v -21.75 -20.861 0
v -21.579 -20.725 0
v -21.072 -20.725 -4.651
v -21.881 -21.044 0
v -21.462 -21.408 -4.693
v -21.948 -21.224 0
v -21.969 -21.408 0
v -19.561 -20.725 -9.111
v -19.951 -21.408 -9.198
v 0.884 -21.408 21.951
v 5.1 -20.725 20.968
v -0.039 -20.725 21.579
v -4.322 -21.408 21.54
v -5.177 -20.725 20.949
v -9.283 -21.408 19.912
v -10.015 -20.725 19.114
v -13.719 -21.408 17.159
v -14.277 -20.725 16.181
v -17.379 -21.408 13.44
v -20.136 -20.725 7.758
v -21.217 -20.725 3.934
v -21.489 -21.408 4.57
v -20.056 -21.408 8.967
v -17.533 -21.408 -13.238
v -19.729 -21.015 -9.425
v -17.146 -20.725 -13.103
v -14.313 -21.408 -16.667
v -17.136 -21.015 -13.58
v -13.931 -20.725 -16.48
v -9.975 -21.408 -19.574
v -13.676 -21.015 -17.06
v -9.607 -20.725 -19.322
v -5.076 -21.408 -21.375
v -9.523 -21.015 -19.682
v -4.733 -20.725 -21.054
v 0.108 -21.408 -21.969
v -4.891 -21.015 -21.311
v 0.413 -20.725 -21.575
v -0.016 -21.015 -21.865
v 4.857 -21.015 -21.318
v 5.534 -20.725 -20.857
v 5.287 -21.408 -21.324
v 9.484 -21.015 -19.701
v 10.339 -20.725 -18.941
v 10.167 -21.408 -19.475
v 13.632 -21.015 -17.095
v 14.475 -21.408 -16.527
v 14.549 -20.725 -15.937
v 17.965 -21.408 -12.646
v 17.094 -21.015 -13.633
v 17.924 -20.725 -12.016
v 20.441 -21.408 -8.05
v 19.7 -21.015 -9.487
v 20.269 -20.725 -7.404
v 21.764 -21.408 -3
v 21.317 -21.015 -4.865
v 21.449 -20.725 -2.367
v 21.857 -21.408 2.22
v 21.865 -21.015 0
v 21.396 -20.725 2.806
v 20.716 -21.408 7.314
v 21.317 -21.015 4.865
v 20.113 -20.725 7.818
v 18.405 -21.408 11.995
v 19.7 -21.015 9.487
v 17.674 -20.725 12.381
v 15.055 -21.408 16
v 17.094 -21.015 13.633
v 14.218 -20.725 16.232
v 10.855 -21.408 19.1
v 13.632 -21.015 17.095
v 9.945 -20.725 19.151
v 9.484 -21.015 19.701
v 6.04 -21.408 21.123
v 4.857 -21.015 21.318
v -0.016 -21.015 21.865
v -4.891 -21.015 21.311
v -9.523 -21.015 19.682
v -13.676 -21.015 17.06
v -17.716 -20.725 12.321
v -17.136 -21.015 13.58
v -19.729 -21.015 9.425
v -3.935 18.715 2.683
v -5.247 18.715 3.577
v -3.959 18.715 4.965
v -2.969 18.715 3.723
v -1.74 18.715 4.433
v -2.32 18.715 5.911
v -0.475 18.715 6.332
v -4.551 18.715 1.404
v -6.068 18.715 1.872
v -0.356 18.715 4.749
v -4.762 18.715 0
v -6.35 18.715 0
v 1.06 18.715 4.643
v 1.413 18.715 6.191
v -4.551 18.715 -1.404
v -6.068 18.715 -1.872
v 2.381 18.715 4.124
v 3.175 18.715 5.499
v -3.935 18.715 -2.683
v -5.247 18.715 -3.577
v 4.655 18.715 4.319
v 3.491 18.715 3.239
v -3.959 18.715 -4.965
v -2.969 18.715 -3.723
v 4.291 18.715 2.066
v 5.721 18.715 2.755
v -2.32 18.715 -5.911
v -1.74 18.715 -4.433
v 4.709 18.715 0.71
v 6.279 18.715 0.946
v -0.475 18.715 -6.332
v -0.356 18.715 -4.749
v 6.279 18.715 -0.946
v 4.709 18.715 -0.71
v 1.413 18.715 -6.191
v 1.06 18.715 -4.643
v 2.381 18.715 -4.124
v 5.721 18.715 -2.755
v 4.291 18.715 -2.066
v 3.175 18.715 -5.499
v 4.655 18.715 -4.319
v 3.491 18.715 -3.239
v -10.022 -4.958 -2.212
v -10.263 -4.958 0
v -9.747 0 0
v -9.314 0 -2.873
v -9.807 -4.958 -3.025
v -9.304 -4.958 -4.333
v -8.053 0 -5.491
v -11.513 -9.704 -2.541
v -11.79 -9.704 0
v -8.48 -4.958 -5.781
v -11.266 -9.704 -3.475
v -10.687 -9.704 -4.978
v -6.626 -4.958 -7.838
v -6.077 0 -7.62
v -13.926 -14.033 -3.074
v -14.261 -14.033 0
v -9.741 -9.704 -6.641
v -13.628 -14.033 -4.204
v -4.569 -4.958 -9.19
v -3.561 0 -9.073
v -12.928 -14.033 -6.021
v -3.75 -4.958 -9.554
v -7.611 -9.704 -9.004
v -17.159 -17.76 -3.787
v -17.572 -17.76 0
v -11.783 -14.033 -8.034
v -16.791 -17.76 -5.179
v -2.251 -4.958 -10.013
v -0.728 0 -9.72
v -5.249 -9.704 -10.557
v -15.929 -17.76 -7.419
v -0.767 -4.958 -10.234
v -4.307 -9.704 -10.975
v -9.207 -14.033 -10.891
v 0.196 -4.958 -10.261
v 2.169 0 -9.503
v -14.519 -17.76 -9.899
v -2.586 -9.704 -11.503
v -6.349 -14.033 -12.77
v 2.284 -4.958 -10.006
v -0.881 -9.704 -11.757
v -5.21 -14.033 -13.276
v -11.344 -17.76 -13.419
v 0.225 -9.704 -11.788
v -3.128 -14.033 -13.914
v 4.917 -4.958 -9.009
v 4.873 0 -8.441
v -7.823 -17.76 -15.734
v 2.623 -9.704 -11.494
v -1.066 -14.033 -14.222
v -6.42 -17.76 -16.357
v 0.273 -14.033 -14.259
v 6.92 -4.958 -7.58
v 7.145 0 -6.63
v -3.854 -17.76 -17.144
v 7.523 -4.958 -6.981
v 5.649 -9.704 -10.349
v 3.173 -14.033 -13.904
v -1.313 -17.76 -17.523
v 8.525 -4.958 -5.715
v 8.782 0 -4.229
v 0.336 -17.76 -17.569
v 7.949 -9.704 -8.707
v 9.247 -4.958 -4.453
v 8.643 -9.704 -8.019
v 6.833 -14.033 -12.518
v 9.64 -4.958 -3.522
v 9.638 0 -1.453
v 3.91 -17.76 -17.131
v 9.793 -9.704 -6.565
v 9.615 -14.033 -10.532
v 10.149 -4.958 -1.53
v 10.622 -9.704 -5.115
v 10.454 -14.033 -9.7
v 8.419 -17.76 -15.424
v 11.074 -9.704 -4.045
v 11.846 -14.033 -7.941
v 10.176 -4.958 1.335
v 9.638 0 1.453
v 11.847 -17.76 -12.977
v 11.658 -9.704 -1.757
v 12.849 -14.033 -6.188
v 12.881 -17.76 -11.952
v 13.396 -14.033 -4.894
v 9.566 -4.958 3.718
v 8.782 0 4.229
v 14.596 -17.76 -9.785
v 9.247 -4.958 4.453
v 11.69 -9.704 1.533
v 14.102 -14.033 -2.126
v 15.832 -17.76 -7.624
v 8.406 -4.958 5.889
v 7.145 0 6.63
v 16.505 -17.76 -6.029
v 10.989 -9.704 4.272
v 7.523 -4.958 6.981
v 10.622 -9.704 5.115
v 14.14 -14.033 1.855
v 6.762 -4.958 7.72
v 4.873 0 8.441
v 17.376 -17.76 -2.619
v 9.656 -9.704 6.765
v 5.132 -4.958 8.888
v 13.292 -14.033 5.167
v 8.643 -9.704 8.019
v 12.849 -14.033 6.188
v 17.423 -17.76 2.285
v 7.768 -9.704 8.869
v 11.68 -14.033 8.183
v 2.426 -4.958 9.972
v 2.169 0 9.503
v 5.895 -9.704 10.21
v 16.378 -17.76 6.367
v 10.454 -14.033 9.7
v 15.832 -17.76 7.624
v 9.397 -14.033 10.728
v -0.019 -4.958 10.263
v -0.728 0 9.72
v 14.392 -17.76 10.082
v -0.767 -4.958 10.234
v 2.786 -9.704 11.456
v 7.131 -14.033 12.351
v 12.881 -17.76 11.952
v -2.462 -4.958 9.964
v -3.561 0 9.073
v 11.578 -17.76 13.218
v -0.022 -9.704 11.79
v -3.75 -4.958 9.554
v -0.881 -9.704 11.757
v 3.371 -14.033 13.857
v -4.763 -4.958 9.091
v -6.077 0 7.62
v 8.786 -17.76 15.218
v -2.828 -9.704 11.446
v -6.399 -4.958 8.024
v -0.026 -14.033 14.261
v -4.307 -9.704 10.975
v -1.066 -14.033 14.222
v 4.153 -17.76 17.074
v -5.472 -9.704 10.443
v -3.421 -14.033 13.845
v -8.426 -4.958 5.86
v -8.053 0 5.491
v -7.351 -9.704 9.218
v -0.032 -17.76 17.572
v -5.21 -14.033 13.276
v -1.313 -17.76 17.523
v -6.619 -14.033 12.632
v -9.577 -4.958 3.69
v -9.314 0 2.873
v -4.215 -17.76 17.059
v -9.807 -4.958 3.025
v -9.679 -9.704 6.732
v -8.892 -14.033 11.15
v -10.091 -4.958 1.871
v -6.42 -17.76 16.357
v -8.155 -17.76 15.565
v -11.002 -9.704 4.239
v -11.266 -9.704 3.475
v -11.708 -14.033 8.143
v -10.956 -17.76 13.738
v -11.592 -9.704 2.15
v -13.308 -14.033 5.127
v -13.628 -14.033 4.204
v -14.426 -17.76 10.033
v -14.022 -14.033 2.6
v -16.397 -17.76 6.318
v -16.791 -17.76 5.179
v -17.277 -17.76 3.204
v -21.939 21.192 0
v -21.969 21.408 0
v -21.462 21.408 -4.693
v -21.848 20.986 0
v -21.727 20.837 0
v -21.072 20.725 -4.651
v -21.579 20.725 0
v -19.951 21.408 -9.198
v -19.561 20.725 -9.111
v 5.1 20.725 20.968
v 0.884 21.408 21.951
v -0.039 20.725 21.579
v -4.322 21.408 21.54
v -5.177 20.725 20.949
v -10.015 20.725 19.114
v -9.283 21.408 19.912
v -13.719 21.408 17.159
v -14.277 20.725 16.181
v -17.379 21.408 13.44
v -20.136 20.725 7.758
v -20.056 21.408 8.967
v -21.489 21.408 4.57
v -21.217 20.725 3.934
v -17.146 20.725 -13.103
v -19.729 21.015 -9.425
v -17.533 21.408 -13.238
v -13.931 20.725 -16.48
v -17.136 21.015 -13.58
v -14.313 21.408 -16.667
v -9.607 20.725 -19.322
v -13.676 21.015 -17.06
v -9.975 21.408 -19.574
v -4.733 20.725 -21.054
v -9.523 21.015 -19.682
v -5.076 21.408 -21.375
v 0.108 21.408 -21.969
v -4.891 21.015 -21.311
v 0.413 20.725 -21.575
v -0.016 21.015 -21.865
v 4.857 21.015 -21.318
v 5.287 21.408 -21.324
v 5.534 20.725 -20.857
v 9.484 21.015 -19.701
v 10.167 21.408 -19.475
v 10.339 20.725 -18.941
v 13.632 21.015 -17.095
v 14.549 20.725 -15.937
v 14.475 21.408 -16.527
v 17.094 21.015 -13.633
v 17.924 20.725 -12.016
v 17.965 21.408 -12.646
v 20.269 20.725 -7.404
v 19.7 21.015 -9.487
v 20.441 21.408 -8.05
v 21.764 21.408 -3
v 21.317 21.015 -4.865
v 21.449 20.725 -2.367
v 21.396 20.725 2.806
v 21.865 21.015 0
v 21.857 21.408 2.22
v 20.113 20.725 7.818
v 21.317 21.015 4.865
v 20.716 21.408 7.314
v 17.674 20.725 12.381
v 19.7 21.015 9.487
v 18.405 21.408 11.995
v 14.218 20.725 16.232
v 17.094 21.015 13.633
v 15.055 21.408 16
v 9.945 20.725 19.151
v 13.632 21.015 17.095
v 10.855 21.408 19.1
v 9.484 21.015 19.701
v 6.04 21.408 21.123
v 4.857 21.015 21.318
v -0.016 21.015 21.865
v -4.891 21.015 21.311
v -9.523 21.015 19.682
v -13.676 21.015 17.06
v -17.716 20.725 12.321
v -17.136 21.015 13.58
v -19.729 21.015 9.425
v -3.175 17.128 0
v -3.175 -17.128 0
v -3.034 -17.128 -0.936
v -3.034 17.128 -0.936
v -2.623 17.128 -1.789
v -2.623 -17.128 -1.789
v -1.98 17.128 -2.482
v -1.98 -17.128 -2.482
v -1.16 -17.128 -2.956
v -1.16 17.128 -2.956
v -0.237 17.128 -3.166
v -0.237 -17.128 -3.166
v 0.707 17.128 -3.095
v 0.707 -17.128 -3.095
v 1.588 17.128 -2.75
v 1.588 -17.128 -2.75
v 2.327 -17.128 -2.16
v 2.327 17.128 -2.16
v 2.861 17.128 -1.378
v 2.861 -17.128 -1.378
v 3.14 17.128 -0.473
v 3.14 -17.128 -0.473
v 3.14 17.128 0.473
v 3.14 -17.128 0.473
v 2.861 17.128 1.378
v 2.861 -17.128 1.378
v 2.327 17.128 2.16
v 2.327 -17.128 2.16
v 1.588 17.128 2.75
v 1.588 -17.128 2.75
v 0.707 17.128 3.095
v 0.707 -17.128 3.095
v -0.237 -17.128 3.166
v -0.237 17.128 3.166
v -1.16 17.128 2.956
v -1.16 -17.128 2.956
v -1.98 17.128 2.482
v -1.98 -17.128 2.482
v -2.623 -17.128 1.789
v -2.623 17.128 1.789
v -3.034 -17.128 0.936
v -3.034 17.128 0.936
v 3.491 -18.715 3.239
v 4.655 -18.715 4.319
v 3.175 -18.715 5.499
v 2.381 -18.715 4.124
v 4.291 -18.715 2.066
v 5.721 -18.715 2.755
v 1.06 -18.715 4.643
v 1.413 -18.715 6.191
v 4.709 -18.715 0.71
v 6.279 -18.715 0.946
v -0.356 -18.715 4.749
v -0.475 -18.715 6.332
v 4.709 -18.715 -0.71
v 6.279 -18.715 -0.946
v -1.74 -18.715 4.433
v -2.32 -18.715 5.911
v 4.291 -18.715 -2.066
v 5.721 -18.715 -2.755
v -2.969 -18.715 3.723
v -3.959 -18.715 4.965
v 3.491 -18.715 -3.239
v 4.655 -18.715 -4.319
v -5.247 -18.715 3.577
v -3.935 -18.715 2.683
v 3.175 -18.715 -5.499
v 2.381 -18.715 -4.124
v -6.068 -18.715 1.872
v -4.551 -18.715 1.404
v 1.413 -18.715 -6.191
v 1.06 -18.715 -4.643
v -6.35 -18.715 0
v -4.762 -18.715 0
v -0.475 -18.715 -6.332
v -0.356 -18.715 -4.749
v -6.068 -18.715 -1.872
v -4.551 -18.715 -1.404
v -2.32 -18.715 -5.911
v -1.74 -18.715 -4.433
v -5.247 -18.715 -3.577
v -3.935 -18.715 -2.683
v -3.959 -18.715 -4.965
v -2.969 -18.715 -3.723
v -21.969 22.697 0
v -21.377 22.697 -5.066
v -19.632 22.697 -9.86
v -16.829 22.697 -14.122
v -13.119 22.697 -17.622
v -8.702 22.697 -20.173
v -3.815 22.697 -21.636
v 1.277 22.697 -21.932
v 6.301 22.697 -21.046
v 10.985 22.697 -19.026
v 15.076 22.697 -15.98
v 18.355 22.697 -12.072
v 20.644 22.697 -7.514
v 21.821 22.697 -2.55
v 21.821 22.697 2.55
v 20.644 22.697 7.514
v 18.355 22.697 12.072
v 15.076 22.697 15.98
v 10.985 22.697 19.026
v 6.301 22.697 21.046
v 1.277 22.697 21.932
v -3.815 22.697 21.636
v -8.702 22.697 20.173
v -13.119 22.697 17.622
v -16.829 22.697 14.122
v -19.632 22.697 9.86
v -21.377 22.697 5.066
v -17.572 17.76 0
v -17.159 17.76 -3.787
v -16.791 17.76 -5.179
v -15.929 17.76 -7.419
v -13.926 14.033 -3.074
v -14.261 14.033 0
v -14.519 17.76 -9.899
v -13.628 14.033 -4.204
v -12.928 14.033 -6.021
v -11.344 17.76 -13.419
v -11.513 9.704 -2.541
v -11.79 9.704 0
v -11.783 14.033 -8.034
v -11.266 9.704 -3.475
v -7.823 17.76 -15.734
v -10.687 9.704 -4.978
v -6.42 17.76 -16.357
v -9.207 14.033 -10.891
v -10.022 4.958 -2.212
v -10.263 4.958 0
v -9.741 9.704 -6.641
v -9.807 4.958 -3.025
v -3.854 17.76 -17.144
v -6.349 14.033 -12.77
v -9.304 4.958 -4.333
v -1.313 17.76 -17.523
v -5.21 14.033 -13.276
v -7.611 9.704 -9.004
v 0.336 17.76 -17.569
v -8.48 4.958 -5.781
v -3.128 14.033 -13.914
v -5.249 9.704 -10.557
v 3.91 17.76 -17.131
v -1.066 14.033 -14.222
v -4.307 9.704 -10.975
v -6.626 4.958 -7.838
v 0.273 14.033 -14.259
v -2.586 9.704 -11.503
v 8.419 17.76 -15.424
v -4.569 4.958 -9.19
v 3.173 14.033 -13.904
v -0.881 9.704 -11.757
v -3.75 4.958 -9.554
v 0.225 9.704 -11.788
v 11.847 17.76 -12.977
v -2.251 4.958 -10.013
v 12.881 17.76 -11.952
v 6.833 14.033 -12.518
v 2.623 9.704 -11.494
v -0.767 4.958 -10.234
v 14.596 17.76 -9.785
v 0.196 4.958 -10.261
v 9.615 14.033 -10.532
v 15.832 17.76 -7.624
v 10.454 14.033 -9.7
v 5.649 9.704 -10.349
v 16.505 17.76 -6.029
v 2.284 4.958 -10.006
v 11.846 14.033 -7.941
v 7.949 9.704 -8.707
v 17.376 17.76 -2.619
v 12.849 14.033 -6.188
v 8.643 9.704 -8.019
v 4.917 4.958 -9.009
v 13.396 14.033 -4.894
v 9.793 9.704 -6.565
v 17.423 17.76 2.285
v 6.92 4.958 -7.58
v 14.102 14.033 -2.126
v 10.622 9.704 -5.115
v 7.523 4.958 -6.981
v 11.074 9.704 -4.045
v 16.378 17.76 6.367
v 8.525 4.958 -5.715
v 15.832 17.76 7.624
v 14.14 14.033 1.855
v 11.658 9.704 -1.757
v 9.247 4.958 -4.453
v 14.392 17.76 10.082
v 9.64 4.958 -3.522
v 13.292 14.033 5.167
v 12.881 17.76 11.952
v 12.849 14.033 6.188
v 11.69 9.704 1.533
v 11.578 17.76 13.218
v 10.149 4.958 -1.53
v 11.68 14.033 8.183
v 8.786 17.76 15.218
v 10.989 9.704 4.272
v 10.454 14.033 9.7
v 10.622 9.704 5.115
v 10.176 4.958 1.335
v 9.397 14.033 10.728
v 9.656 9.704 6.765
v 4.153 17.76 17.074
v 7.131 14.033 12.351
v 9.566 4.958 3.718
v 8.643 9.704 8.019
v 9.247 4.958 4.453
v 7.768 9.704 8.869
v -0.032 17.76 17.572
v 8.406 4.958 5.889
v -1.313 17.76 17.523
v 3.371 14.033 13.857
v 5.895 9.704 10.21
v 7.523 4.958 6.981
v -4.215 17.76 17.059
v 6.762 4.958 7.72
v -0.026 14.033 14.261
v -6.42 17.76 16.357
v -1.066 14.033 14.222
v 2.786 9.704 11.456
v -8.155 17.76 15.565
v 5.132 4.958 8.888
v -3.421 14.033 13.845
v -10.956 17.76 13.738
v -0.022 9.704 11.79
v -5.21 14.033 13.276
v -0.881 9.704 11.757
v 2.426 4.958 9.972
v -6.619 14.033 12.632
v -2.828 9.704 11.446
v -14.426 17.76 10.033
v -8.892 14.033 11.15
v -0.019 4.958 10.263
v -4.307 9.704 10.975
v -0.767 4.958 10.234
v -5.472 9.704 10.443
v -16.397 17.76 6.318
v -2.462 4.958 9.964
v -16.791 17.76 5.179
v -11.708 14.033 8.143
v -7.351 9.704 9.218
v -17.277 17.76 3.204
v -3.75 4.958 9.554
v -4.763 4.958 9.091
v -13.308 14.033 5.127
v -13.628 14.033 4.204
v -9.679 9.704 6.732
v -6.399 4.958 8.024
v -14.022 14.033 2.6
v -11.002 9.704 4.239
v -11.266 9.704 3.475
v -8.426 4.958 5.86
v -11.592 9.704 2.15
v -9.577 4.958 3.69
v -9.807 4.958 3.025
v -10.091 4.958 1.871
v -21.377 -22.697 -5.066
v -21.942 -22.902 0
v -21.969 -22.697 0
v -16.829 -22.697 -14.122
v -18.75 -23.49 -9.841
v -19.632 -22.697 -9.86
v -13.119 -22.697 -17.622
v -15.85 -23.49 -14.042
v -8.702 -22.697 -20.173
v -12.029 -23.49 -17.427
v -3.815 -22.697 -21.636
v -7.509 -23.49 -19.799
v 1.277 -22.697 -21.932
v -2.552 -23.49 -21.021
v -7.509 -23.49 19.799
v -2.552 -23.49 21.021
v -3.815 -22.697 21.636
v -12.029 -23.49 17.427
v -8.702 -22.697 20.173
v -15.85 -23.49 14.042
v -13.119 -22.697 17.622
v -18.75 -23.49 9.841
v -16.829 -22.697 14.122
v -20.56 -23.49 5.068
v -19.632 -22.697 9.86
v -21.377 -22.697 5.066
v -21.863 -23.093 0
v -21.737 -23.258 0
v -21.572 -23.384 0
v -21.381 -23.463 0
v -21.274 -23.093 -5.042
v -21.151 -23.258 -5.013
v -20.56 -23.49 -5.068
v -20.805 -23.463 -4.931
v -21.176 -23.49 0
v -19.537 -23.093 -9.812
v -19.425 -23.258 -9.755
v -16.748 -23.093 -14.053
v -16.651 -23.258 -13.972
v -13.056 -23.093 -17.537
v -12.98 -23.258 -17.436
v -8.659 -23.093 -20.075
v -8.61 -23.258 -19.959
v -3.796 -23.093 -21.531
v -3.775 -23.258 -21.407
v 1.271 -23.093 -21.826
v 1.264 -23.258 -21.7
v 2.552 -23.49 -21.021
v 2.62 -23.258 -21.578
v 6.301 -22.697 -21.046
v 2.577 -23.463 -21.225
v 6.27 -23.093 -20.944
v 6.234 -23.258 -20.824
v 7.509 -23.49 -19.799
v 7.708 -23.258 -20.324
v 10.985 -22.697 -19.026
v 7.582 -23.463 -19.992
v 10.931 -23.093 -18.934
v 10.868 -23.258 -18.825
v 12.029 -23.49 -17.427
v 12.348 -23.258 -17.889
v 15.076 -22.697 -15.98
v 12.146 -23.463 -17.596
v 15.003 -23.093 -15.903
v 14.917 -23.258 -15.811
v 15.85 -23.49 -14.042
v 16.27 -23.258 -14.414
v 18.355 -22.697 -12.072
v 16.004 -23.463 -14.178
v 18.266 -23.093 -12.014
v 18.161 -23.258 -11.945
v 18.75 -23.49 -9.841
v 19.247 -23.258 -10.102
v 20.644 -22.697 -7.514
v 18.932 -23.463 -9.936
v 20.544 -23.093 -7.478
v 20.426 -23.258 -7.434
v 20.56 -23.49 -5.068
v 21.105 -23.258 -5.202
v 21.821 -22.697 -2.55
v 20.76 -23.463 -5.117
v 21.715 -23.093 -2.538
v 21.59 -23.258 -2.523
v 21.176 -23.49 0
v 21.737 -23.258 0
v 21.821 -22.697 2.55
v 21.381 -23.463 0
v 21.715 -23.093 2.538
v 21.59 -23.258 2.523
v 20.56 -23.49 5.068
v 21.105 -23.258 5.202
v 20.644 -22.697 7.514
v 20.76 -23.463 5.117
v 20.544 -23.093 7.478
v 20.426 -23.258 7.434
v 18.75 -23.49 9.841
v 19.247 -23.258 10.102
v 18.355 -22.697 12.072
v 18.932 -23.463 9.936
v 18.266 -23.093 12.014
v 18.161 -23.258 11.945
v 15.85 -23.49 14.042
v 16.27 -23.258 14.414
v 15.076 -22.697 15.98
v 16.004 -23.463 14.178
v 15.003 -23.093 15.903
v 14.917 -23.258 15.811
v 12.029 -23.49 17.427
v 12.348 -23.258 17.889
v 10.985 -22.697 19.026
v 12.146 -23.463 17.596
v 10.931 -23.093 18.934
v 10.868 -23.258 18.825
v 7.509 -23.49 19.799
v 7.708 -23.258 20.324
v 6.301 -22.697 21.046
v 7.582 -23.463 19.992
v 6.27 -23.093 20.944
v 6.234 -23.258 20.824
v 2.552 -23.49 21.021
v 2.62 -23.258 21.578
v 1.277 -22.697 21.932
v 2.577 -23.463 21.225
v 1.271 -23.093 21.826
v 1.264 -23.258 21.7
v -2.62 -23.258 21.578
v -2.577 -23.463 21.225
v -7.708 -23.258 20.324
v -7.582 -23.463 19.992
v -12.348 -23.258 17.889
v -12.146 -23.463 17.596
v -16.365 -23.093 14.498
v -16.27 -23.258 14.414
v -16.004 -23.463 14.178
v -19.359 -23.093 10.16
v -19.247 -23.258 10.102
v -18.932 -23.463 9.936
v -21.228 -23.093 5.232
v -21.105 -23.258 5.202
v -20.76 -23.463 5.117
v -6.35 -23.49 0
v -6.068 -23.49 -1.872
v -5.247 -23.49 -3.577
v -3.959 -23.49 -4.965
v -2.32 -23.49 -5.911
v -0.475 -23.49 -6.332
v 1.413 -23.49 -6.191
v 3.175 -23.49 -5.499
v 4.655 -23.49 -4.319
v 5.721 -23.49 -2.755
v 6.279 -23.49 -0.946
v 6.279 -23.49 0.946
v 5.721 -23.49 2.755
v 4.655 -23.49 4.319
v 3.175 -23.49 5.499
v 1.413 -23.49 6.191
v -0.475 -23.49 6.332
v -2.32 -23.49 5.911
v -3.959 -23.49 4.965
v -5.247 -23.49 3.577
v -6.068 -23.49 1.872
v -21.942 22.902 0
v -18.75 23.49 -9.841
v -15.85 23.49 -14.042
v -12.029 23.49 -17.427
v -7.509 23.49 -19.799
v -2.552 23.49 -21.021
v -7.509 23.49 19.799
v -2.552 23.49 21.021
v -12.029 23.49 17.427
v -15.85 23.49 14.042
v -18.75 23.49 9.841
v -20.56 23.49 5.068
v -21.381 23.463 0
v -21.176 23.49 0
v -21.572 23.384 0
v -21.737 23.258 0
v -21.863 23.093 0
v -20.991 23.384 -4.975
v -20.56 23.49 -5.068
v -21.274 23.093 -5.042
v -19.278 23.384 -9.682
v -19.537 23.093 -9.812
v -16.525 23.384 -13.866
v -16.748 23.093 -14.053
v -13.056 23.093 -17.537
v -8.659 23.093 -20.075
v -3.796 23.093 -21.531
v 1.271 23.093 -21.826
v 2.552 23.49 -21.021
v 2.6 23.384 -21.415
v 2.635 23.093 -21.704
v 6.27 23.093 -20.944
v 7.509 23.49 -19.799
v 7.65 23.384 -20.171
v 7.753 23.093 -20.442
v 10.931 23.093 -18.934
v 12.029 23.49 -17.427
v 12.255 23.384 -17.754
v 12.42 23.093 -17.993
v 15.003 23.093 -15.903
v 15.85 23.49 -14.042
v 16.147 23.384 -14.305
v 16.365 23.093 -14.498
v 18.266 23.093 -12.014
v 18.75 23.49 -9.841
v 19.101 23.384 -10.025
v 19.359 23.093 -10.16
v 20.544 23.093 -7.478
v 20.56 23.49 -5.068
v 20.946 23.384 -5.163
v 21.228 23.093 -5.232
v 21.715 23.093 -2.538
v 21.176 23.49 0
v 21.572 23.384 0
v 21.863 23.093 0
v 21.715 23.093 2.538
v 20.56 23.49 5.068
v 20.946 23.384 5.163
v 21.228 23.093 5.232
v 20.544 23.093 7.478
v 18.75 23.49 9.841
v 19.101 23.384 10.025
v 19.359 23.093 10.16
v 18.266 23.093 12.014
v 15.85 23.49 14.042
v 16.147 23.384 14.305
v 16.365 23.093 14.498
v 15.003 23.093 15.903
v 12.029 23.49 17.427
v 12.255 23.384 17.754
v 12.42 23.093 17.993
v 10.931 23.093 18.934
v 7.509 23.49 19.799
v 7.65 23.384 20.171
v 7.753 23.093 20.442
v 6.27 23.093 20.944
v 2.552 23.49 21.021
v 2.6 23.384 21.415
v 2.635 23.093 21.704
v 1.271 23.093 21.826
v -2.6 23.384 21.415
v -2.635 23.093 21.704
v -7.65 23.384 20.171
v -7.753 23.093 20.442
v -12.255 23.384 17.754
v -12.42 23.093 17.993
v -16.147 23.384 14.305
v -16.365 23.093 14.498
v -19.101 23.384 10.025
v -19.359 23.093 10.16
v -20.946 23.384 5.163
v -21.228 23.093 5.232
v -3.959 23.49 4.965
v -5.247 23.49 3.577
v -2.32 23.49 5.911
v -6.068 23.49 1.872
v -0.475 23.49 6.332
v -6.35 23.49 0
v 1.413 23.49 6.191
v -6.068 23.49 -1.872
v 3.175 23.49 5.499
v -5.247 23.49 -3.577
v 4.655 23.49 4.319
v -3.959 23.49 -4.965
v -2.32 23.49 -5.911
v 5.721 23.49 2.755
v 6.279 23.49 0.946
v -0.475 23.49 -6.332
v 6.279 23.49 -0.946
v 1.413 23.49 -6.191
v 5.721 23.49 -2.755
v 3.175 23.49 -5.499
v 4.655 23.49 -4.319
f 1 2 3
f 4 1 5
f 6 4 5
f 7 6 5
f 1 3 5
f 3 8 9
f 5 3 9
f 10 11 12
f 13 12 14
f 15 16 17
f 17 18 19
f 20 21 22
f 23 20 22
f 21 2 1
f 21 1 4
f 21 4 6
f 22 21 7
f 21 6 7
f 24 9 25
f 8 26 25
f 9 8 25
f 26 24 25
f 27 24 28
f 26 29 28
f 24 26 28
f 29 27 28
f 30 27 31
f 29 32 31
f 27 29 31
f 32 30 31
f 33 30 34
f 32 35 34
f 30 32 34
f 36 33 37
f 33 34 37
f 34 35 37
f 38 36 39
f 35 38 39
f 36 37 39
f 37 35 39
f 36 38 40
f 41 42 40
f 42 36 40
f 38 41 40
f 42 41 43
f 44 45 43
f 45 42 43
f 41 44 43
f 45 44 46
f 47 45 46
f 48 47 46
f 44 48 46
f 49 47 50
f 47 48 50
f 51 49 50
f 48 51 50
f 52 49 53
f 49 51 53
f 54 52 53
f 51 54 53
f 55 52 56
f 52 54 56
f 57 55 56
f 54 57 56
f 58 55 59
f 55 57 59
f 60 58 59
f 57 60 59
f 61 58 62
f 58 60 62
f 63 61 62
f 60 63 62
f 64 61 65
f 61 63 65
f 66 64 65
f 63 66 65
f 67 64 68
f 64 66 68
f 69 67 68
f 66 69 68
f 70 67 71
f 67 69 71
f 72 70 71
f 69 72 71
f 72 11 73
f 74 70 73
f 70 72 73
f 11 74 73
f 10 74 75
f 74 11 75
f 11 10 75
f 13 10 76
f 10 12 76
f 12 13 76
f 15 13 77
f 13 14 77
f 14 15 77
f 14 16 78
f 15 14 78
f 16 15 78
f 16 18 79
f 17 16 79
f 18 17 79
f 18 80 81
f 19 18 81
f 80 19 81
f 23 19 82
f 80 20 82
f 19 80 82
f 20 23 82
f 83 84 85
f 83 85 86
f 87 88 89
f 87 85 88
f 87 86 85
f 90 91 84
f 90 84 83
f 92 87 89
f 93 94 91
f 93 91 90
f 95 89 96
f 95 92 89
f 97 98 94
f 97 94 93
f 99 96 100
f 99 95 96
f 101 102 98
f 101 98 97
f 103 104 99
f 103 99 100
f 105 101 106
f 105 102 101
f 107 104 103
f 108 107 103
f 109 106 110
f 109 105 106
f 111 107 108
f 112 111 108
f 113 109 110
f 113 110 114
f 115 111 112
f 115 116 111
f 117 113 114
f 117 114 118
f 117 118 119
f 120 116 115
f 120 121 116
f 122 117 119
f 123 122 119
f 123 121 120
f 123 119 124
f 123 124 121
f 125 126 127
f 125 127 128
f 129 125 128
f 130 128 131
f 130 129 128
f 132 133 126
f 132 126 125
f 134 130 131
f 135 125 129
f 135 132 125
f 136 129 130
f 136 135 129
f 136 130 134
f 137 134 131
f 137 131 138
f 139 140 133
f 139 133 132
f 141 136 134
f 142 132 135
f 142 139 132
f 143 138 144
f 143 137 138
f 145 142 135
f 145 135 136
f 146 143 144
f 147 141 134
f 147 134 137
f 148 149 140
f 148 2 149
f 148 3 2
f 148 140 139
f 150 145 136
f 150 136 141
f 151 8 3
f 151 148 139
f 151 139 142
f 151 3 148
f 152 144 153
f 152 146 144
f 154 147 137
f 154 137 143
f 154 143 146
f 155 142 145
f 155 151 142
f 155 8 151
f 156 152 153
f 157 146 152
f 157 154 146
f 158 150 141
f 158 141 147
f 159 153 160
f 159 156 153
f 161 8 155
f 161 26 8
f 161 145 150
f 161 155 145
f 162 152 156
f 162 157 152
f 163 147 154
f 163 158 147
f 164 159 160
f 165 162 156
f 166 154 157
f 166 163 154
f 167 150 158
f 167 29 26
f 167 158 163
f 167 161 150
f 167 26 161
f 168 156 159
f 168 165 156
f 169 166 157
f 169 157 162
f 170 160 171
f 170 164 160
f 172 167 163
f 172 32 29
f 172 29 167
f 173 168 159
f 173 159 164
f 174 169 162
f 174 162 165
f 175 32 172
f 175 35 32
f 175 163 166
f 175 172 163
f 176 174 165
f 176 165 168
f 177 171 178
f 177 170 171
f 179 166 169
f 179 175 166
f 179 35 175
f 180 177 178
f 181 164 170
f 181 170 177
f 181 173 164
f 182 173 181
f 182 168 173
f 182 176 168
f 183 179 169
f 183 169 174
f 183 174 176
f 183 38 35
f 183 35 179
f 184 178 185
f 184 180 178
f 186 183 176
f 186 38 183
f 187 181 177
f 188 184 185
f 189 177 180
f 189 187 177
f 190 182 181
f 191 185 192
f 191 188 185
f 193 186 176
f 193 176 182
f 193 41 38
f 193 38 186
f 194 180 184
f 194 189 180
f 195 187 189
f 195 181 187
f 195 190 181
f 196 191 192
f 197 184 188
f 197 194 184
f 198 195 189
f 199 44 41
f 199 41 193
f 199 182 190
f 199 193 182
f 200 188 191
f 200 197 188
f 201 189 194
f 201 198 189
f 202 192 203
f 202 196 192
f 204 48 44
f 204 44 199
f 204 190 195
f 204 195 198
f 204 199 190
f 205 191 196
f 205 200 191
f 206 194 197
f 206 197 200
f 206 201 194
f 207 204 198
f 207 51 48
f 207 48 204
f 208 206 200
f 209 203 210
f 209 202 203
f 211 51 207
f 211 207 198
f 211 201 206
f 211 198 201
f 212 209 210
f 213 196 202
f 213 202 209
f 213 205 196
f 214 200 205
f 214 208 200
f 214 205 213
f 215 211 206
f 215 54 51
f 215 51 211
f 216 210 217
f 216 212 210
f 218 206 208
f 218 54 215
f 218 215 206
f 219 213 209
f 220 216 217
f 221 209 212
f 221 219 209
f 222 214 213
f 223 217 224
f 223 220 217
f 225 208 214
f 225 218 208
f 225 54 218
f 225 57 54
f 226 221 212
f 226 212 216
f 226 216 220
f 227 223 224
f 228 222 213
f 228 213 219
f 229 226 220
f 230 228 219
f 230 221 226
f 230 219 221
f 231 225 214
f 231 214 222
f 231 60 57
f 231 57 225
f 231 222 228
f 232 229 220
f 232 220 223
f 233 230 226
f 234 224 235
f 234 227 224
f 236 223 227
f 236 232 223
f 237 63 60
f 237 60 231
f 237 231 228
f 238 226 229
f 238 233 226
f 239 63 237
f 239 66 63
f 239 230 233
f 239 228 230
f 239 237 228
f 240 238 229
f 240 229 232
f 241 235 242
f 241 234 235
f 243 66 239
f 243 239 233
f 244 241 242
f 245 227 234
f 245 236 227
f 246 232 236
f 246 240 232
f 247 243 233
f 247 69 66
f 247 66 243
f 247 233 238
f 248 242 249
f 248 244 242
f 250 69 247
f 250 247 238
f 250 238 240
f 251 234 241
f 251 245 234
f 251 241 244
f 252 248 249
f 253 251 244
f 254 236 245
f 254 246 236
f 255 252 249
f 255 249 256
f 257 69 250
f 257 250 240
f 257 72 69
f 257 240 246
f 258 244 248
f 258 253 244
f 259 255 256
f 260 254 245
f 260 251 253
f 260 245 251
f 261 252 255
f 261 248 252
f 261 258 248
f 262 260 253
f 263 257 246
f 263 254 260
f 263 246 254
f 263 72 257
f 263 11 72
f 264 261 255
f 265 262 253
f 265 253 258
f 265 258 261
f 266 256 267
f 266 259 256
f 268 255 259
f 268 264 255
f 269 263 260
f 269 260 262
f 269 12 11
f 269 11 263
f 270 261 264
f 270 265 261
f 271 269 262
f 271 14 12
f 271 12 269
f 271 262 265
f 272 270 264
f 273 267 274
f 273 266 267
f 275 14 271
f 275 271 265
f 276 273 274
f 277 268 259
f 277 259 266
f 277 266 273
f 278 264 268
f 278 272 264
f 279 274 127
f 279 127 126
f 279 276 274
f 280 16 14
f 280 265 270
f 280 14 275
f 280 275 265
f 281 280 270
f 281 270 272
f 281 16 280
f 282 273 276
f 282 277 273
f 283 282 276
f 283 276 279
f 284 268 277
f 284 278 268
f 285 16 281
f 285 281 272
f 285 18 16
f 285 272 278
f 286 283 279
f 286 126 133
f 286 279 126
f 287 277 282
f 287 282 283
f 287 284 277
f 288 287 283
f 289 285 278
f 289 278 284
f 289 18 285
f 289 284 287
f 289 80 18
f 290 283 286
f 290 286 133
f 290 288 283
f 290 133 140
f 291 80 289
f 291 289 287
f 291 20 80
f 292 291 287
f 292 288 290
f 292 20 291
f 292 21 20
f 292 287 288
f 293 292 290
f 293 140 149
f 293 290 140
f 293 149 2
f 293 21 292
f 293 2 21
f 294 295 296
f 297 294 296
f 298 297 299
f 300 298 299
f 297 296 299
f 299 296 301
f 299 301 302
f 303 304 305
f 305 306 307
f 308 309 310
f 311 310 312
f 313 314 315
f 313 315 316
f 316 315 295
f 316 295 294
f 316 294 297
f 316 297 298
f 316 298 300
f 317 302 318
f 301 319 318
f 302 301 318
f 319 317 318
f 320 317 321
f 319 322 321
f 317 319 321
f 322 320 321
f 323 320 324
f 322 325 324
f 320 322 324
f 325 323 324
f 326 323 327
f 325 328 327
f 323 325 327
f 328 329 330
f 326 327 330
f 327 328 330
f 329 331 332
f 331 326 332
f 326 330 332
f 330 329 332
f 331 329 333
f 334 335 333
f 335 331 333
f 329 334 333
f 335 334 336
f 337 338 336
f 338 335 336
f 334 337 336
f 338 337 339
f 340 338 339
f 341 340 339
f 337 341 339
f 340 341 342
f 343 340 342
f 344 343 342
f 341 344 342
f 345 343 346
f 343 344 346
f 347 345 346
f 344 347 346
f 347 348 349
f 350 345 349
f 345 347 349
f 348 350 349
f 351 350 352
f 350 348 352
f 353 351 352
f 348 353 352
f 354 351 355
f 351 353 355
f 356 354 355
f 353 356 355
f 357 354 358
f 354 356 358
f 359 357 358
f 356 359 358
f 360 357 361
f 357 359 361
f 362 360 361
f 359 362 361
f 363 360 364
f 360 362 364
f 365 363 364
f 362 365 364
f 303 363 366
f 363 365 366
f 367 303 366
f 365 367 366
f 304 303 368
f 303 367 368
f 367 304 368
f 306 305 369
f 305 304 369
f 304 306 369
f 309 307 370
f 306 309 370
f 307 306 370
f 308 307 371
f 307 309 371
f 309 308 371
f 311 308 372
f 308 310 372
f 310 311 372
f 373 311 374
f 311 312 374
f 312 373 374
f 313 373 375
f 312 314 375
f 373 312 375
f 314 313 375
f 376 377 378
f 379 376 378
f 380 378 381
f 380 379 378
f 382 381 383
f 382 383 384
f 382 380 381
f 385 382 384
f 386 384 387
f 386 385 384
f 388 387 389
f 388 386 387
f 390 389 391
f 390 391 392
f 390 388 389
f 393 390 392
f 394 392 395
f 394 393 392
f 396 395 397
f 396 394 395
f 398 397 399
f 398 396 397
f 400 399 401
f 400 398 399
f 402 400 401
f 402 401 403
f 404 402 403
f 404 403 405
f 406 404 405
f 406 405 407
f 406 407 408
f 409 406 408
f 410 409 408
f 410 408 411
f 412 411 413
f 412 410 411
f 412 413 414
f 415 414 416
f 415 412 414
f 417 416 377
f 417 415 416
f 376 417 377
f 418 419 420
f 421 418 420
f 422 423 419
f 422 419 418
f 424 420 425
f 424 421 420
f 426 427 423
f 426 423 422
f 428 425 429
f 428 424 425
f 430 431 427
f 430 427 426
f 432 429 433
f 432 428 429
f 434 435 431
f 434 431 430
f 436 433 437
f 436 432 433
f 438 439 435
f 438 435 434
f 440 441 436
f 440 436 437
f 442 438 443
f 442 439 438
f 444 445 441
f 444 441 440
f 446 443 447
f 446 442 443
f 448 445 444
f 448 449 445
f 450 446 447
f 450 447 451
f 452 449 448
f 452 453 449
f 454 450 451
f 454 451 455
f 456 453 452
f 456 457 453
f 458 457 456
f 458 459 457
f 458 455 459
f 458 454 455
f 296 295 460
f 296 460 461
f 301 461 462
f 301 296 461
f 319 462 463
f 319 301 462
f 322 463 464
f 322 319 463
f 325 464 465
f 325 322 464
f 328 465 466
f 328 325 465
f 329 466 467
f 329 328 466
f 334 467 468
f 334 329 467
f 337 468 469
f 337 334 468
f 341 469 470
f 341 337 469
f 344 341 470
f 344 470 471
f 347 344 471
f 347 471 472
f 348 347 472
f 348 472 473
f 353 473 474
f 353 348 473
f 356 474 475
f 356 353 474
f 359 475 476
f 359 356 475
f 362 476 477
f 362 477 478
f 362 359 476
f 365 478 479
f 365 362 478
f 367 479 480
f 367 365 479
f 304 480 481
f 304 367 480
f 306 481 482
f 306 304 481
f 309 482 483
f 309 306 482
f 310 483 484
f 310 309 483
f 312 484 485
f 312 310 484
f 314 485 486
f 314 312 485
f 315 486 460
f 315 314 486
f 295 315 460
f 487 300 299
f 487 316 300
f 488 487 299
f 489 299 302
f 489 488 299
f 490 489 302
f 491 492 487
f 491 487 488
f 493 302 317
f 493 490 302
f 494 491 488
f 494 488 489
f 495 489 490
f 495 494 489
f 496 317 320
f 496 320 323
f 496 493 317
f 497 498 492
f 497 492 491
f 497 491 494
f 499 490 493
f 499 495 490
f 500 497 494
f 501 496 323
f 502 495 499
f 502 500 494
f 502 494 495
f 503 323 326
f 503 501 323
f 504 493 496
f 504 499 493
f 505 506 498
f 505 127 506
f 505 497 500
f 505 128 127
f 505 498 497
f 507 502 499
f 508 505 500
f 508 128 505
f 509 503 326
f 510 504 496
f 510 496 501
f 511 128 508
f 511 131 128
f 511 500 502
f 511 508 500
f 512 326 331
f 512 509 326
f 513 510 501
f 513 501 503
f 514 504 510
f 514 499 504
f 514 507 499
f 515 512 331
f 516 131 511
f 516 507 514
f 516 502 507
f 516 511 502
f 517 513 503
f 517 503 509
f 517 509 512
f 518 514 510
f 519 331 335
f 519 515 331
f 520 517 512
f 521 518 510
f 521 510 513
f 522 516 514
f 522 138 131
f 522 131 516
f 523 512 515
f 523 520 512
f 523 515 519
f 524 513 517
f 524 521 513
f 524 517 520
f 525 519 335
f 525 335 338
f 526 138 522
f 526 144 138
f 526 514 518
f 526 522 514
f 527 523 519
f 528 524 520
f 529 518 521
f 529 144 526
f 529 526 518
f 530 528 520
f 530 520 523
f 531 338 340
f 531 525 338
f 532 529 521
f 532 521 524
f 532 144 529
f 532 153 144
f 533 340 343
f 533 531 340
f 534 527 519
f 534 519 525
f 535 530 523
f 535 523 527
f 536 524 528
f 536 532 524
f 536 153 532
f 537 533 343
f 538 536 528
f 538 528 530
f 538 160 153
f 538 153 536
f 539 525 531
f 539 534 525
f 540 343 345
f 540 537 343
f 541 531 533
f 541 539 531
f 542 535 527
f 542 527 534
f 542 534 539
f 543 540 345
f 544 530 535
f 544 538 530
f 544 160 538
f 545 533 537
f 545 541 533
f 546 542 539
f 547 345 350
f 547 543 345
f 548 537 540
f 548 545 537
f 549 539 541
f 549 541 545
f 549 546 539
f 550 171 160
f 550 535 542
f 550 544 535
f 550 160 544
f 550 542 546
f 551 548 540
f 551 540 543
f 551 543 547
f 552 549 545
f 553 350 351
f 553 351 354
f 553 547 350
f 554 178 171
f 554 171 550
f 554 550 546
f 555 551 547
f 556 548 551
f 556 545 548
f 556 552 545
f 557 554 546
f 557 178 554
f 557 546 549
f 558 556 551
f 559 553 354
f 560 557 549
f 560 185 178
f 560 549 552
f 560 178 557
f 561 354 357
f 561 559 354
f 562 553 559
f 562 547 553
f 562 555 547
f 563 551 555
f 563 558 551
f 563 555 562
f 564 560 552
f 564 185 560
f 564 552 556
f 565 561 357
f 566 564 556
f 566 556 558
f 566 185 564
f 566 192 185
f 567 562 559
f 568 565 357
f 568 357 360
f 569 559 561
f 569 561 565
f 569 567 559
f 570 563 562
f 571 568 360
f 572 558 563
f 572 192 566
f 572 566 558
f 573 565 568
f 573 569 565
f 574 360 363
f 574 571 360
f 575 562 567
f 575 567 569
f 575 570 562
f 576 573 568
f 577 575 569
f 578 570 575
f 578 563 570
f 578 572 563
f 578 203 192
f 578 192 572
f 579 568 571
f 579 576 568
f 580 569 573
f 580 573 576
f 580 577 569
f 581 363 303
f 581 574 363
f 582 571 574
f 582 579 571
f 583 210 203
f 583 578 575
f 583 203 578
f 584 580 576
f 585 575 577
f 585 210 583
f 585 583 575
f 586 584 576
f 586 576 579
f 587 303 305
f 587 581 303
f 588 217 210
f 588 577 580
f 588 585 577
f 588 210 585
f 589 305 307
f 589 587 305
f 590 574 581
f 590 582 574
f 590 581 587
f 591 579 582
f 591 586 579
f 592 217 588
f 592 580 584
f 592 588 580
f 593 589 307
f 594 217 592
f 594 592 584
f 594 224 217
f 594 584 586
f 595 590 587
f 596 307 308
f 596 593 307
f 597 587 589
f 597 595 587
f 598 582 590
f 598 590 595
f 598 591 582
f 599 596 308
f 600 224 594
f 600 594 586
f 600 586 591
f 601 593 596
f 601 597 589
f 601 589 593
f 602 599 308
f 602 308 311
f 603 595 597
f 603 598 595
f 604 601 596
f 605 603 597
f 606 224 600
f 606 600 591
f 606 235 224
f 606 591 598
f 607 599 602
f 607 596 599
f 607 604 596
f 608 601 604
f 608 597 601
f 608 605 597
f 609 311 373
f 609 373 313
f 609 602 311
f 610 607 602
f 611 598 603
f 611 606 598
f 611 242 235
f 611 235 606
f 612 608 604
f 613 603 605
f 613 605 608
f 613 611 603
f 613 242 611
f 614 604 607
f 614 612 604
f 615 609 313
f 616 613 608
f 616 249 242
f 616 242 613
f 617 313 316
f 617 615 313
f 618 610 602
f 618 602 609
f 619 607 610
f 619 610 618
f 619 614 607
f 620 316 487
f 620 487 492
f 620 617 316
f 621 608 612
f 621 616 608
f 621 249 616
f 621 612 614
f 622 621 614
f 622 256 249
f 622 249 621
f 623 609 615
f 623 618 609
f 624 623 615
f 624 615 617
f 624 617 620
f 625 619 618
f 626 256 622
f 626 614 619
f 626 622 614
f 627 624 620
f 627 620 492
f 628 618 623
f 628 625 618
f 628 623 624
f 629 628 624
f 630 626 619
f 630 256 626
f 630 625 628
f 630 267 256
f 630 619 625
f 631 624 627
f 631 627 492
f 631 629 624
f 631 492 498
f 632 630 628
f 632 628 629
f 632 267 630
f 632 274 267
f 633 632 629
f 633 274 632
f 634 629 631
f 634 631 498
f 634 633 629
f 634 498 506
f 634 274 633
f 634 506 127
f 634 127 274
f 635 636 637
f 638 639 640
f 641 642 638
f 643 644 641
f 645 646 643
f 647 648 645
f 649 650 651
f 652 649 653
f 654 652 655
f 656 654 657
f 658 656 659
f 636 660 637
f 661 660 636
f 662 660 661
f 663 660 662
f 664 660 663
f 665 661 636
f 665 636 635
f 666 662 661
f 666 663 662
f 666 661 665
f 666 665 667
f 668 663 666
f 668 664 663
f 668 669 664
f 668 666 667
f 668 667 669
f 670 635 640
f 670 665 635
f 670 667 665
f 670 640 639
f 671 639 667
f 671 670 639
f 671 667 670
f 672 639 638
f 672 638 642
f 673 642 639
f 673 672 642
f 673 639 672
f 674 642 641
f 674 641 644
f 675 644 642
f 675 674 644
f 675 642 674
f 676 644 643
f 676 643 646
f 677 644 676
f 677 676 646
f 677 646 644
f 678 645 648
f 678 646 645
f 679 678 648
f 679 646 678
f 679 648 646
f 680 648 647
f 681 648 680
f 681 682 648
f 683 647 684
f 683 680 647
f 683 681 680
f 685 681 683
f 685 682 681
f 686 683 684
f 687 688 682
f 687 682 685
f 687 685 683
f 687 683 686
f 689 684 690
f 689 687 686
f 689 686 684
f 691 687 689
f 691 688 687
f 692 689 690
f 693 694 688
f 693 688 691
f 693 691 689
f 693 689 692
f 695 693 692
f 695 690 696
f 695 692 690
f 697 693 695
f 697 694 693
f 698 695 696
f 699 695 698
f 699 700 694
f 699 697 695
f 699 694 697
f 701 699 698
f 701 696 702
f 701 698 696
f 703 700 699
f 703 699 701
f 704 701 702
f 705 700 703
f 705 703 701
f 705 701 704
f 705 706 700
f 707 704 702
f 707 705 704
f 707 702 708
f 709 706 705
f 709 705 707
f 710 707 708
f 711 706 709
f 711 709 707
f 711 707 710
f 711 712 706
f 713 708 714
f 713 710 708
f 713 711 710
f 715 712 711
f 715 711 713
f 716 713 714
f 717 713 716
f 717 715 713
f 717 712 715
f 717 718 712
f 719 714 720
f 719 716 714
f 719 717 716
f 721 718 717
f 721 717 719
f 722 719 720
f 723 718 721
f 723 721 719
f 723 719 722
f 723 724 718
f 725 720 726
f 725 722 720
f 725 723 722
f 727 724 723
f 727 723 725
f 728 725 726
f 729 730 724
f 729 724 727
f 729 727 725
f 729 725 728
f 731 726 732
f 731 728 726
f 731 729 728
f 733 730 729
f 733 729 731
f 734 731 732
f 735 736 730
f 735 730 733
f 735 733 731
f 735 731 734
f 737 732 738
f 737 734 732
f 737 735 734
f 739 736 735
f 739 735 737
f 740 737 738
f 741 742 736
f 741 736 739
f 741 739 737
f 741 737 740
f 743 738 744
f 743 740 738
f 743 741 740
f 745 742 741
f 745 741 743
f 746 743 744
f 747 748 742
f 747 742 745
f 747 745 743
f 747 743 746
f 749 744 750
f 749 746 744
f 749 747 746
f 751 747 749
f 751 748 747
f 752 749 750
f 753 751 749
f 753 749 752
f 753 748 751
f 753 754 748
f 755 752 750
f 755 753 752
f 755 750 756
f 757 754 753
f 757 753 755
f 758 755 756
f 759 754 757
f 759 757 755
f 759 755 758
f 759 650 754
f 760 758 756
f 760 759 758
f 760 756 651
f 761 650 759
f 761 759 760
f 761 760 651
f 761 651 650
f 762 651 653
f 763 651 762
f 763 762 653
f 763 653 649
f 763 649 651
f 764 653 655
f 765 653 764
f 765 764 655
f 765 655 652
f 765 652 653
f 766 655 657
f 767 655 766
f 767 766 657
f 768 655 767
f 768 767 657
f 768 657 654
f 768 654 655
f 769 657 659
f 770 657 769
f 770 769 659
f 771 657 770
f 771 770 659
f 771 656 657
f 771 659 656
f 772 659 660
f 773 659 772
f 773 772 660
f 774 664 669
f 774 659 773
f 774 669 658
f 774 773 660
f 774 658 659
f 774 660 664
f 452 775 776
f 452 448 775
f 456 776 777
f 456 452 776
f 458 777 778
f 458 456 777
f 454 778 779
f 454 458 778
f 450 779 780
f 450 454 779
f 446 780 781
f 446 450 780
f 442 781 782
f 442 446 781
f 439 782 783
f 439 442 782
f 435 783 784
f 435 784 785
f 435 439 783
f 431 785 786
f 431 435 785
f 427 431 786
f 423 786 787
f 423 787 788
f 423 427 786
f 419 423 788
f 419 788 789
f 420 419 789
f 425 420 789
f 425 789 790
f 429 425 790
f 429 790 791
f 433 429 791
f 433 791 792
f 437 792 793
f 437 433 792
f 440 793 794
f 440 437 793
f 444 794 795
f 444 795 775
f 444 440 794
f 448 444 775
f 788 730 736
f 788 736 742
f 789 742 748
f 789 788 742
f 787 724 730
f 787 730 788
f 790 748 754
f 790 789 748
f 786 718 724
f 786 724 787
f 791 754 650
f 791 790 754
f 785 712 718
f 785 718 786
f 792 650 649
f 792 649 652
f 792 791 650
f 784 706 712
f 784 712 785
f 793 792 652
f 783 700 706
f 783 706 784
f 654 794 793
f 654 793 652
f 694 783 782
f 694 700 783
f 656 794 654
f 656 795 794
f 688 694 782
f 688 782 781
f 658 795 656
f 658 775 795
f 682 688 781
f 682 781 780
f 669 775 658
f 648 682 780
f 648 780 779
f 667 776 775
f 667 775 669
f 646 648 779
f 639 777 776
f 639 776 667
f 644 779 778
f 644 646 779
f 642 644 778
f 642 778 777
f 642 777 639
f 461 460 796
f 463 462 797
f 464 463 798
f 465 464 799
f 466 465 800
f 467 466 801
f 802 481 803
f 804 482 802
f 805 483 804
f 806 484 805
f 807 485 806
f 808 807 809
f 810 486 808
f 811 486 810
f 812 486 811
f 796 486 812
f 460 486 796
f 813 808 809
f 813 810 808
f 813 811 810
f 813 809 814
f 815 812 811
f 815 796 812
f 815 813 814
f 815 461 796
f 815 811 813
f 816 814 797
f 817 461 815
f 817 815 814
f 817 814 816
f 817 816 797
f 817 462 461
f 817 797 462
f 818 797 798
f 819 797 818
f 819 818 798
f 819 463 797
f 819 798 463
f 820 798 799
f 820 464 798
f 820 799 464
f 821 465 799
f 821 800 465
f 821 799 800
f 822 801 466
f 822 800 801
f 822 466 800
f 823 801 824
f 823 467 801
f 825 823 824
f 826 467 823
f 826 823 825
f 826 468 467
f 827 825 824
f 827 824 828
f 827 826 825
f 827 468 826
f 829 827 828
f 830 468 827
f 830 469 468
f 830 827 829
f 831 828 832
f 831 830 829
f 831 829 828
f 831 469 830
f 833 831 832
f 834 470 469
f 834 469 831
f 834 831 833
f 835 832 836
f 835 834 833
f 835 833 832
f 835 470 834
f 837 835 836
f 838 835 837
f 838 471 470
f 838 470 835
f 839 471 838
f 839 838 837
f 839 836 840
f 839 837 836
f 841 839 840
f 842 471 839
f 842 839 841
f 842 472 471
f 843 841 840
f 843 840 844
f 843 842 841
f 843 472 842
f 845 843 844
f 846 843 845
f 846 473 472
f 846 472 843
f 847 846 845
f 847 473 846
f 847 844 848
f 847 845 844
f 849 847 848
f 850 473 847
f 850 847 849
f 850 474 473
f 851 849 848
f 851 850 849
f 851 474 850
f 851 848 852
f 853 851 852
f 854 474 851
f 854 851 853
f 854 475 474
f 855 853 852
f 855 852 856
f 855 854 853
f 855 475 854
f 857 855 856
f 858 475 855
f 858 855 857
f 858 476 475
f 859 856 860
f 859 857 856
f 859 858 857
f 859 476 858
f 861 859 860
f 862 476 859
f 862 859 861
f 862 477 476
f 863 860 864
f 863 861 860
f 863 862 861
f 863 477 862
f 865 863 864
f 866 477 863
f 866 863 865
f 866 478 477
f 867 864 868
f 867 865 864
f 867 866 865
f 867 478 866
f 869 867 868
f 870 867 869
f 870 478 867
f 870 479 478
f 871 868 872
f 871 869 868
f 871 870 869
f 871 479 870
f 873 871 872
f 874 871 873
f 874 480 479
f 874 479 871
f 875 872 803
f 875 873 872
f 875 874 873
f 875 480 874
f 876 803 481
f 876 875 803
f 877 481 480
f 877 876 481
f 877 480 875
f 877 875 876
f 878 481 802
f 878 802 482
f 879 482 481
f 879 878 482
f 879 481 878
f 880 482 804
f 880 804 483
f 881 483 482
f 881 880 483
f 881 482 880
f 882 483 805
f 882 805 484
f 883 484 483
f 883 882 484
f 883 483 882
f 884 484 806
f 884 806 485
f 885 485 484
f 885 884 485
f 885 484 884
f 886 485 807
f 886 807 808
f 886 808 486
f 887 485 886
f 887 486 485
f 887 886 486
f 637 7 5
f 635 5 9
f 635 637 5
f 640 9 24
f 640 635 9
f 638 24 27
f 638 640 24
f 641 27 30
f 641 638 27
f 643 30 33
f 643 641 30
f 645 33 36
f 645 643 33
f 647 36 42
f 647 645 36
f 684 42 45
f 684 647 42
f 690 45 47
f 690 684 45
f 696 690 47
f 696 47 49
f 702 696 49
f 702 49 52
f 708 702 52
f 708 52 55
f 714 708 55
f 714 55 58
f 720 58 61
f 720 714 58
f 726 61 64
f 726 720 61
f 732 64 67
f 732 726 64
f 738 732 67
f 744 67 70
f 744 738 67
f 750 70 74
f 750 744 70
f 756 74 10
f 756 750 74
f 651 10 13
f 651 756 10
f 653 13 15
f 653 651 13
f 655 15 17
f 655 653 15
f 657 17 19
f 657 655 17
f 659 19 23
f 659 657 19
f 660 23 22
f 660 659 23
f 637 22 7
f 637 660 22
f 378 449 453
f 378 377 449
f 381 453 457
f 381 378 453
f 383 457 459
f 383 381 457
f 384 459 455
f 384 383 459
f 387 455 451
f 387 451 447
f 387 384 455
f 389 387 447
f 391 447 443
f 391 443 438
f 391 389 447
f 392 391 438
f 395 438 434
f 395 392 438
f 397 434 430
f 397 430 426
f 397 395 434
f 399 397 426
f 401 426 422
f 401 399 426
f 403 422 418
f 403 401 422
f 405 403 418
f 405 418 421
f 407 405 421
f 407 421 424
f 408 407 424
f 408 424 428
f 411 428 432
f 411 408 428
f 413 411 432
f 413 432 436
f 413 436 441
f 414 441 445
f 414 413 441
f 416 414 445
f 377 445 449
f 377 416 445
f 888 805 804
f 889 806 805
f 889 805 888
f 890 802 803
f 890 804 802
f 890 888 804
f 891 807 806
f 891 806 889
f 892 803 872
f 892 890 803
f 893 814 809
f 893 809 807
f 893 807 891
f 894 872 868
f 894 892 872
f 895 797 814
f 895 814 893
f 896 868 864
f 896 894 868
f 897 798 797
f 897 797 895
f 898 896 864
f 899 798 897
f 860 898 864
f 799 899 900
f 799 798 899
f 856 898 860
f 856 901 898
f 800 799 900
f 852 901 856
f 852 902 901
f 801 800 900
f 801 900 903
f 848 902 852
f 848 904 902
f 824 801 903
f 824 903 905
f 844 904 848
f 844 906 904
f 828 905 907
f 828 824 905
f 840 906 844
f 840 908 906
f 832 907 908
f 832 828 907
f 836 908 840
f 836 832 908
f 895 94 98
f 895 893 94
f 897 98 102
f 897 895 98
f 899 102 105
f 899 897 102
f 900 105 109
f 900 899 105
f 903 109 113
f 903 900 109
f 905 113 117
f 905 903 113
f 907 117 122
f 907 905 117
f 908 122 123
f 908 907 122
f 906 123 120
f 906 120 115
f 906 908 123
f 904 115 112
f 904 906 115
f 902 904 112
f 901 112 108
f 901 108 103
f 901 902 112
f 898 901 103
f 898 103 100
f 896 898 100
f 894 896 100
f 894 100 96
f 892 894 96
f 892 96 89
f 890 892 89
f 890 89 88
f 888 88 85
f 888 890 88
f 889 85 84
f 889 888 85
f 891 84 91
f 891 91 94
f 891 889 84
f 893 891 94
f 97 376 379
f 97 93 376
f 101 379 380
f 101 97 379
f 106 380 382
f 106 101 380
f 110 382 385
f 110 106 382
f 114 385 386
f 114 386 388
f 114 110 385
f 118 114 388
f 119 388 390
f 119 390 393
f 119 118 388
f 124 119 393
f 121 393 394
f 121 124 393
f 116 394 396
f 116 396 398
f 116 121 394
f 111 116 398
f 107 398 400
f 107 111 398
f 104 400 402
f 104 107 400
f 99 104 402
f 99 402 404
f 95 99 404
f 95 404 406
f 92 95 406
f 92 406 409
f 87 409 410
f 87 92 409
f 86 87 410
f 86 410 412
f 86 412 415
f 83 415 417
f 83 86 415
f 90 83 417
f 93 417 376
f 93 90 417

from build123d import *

# Parameters (mm, degrees)
FILLET1_R = 0.79375


with BuildPart() as part:
    # Sketch1 → Revolve1 (revolve)
    with BuildSketch(Plane.XY):
        with BuildLine():
            Line((-6.35, 23.490258671), (-21.969306582, 23.490258671))
            Line((-21.969306582, 23.490258671), (-21.969306582, 20.950258671))
            ThreePointArc((-21.969306582, 20.950258671), (-13.025892187, 12.127448299), (-9.746922584, 0))
            ThreePointArc((-9.746922584, 0), (-13.025892187, -12.127448299), (-21.969306582, -20.950258671))
            Line((-21.969306582, -20.950258671), (-21.969306582, -23.490258671))
            Line((-21.969306582, -23.490258671), (-6.35, -23.490258671))
            Line((-6.35, -23.490258671), (-6.35, -18.715058671))
            Line((-6.35, -18.715058671), (-4.7625, -18.715058671))
            Line((-4.7625, -18.715058671), (-3.175, -17.127558671))
            Line((-3.175, -17.127558671), (-3.175, 17.127558671))
            Line((-3.175, 17.127558671), (-4.7625, 18.715058671))
            Line((-4.7625, 18.715058671), (-6.35, 18.715058671))
            Line((-6.35, 18.715058671), (-6.35, 23.490258671))
        make_face()
    revolve(axis=Axis((0, 23.490258671, 0), (0, -1, 0)))

    # Fillet1
    fillet1_edges = [part.edges().sort_by_distance(p)[0] for p in [
        (21.969306582, 20.950258671, 0),
        (21.969306582, 23.490258671, 0),
        (21.969306582, -23.490258671, 0),
        (21.969306582, -20.950258671, 0),
    ]]
    fillet(fillet1_edges, radius=FILLET1_R)


solid = part.part
